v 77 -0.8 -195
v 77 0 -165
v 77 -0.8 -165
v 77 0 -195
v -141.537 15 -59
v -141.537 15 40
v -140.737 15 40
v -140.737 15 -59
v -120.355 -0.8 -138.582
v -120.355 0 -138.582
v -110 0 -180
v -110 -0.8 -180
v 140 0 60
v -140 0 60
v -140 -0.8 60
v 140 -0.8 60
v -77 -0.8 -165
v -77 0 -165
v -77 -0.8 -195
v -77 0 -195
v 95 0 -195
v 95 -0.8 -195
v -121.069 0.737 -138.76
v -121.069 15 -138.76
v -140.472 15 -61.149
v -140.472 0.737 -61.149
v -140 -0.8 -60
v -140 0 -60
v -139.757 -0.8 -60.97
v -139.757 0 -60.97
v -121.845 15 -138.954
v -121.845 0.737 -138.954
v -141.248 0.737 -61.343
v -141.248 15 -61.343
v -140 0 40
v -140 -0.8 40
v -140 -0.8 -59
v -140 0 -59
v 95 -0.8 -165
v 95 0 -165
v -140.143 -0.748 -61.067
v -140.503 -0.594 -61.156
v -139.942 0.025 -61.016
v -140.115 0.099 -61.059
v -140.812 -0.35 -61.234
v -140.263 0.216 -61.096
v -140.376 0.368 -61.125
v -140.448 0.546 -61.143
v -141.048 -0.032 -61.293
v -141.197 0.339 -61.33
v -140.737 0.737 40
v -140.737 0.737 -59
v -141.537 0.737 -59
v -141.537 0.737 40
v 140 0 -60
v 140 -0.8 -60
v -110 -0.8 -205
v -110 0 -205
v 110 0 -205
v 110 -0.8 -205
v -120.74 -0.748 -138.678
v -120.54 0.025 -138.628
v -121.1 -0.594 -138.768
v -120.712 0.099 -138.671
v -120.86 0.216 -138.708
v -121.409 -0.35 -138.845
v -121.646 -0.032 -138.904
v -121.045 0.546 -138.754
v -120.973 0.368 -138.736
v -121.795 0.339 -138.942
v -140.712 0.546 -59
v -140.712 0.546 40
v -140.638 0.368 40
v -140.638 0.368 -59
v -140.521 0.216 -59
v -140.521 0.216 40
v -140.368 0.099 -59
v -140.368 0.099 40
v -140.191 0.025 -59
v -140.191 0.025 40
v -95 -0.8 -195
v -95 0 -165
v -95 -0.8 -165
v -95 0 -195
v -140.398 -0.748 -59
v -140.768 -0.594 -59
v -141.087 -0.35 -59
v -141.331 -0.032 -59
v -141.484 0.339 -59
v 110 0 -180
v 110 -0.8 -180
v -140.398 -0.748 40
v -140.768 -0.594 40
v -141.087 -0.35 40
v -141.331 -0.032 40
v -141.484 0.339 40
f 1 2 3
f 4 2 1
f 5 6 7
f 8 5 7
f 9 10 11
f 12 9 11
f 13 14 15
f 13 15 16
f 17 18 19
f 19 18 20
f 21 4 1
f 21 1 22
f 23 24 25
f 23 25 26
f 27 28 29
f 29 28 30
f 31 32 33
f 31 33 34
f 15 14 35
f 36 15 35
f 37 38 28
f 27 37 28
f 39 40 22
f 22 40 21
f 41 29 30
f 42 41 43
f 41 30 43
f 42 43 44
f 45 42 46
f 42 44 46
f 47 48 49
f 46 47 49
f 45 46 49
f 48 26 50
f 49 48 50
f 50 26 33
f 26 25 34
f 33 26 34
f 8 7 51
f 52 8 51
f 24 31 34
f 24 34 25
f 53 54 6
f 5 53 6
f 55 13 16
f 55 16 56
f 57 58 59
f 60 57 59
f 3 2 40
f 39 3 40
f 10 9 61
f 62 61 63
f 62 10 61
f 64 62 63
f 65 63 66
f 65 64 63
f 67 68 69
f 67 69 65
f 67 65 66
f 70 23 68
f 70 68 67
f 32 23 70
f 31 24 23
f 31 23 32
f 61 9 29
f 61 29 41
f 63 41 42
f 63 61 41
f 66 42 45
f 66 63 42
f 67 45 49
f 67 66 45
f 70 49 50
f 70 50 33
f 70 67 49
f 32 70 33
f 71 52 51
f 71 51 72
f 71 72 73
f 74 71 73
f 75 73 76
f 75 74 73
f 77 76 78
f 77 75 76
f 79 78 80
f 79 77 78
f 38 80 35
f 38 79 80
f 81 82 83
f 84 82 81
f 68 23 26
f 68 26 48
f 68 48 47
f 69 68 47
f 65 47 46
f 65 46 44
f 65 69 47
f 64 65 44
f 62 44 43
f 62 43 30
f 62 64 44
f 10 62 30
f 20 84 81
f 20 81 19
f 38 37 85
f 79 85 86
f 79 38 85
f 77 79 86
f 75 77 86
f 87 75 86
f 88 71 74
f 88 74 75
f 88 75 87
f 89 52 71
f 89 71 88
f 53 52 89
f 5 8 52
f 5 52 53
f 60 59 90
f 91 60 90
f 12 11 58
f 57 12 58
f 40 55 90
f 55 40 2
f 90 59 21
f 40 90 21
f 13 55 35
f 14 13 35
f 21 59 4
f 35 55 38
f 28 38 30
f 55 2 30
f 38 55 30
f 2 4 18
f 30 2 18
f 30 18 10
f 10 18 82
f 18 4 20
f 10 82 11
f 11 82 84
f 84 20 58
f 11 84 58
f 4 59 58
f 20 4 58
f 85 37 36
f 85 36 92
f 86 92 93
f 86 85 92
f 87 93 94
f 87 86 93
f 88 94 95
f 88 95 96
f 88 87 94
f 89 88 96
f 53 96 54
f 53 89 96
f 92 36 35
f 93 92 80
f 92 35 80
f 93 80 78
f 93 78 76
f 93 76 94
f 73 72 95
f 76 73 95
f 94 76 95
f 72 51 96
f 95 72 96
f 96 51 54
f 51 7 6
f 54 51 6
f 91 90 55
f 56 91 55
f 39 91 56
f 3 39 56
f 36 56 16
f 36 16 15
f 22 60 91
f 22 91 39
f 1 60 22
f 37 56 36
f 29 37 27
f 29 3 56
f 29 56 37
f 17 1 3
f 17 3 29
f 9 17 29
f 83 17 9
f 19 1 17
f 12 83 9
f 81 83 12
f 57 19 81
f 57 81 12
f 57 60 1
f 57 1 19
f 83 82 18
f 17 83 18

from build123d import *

# Parameters (mm, degrees)
SKETCH7_W          = 280
SKETCH7_H          = 120
BASE_FLANGE4_DEPTH = 0.8
TAB2_DEPTH         = 0.8
SKETCH11_W         = 18
SKETCH11_H         = 30
CUT_EXTRUDE1_DEPTH = 249.245120798
EDGE_FLANGE1_DEPTH = 99
EDGE_FLANGE2_DEPTH = 80


# Sheet-metal steps are written as plain solids
with BuildPart() as part:
    # Sketch7 → Base-Flange4 (new body)
    with BuildSketch(Plane(origin=(0, 0, 0), x_dir=(1, 0, 0), z_dir=(0, 1, 0))):
        Rectangle(SKETCH7_W, SKETCH7_H)
    extrude(amount=-BASE_FLANGE4_DEPTH)

    # Sketch10 → Tab2 (add)
    with BuildSketch(Plane(origin=(0, 0, 0), x_dir=(1, 0, 0), z_dir=(0, 1, 0))):
        Polygon((140, 60), (-140, 60), (-110, 180), (-110, 205), (110, 205), (110, 180), align=None)
    extrude(amount=-TAB2_DEPTH)

    # Sketch11 → Cut-Extrude1 (cut, through all)
    with BuildSketch(Plane(origin=(0, 0, 0), x_dir=(1, 0, 0), z_dir=(0, 1, 0))):
        with Locations((-86, 180)):
            Rectangle(SKETCH11_W, SKETCH11_H)
        with Locations((86, 180)):
            Rectangle(SKETCH11_W, SKETCH11_H)
    extrude(amount=-CUT_EXTRUDE1_DEPTH, mode=Mode.SUBTRACT)

    # Edge-Flange1 section (across the edge) → Edge-Flange1 (add)
    with BuildSketch(Plane(origin=(-140.7366, 0, -59), x_dir=(1, 0, 0), z_dir=(0, 0, 1))):
        with BuildLine():
            Line((-0.8, 0.7366), (-0.8, 15))
            Line((-0.8, 15), (0, 15))
            Line((0, 15), (0, 0.7366))
            ThreePointArc((0, 0.7366), (0.215745145, 0.215745145), (0.7366, 0))
            Line((0.7366, 0), (0.7366, -0.8))
            ThreePointArc((0.7366, -0.8), (-0.34994028, -0.34994028), (-0.8, 0.7366))
        make_face()
    extrude(amount=EDGE_FLANGE1_DEPTH)

    # Edge-Flange2 section (across the edge) → Edge-Flange2 (add)
    with BuildSketch(Plane(origin=(-121.069221338, 0, -138.760194253), x_dir=(0.9701425001453319, 3.4914813388431334e-15, 0.24253562503633339), z_dir=(-0.24253562503633339, 0, 0.9701425001453319))):
        with BuildLine():
            Line((-0.8, 0.7366), (-0.8, 15))
            Line((-0.8, 15), (0, 15))
            Line((0, 15), (0, 0.7366))
            ThreePointArc((0, 0.7366), (0.215745145, 0.215745145), (0.7366, 0))
            Line((0.7366, 0), (0.7366, -0.8))
            ThreePointArc((0.7366, -0.8), (-0.34994028, -0.34994028), (-0.8, 0.7366))
        make_face()
    extrude(amount=EDGE_FLANGE2_DEPTH)


solid = part.part
